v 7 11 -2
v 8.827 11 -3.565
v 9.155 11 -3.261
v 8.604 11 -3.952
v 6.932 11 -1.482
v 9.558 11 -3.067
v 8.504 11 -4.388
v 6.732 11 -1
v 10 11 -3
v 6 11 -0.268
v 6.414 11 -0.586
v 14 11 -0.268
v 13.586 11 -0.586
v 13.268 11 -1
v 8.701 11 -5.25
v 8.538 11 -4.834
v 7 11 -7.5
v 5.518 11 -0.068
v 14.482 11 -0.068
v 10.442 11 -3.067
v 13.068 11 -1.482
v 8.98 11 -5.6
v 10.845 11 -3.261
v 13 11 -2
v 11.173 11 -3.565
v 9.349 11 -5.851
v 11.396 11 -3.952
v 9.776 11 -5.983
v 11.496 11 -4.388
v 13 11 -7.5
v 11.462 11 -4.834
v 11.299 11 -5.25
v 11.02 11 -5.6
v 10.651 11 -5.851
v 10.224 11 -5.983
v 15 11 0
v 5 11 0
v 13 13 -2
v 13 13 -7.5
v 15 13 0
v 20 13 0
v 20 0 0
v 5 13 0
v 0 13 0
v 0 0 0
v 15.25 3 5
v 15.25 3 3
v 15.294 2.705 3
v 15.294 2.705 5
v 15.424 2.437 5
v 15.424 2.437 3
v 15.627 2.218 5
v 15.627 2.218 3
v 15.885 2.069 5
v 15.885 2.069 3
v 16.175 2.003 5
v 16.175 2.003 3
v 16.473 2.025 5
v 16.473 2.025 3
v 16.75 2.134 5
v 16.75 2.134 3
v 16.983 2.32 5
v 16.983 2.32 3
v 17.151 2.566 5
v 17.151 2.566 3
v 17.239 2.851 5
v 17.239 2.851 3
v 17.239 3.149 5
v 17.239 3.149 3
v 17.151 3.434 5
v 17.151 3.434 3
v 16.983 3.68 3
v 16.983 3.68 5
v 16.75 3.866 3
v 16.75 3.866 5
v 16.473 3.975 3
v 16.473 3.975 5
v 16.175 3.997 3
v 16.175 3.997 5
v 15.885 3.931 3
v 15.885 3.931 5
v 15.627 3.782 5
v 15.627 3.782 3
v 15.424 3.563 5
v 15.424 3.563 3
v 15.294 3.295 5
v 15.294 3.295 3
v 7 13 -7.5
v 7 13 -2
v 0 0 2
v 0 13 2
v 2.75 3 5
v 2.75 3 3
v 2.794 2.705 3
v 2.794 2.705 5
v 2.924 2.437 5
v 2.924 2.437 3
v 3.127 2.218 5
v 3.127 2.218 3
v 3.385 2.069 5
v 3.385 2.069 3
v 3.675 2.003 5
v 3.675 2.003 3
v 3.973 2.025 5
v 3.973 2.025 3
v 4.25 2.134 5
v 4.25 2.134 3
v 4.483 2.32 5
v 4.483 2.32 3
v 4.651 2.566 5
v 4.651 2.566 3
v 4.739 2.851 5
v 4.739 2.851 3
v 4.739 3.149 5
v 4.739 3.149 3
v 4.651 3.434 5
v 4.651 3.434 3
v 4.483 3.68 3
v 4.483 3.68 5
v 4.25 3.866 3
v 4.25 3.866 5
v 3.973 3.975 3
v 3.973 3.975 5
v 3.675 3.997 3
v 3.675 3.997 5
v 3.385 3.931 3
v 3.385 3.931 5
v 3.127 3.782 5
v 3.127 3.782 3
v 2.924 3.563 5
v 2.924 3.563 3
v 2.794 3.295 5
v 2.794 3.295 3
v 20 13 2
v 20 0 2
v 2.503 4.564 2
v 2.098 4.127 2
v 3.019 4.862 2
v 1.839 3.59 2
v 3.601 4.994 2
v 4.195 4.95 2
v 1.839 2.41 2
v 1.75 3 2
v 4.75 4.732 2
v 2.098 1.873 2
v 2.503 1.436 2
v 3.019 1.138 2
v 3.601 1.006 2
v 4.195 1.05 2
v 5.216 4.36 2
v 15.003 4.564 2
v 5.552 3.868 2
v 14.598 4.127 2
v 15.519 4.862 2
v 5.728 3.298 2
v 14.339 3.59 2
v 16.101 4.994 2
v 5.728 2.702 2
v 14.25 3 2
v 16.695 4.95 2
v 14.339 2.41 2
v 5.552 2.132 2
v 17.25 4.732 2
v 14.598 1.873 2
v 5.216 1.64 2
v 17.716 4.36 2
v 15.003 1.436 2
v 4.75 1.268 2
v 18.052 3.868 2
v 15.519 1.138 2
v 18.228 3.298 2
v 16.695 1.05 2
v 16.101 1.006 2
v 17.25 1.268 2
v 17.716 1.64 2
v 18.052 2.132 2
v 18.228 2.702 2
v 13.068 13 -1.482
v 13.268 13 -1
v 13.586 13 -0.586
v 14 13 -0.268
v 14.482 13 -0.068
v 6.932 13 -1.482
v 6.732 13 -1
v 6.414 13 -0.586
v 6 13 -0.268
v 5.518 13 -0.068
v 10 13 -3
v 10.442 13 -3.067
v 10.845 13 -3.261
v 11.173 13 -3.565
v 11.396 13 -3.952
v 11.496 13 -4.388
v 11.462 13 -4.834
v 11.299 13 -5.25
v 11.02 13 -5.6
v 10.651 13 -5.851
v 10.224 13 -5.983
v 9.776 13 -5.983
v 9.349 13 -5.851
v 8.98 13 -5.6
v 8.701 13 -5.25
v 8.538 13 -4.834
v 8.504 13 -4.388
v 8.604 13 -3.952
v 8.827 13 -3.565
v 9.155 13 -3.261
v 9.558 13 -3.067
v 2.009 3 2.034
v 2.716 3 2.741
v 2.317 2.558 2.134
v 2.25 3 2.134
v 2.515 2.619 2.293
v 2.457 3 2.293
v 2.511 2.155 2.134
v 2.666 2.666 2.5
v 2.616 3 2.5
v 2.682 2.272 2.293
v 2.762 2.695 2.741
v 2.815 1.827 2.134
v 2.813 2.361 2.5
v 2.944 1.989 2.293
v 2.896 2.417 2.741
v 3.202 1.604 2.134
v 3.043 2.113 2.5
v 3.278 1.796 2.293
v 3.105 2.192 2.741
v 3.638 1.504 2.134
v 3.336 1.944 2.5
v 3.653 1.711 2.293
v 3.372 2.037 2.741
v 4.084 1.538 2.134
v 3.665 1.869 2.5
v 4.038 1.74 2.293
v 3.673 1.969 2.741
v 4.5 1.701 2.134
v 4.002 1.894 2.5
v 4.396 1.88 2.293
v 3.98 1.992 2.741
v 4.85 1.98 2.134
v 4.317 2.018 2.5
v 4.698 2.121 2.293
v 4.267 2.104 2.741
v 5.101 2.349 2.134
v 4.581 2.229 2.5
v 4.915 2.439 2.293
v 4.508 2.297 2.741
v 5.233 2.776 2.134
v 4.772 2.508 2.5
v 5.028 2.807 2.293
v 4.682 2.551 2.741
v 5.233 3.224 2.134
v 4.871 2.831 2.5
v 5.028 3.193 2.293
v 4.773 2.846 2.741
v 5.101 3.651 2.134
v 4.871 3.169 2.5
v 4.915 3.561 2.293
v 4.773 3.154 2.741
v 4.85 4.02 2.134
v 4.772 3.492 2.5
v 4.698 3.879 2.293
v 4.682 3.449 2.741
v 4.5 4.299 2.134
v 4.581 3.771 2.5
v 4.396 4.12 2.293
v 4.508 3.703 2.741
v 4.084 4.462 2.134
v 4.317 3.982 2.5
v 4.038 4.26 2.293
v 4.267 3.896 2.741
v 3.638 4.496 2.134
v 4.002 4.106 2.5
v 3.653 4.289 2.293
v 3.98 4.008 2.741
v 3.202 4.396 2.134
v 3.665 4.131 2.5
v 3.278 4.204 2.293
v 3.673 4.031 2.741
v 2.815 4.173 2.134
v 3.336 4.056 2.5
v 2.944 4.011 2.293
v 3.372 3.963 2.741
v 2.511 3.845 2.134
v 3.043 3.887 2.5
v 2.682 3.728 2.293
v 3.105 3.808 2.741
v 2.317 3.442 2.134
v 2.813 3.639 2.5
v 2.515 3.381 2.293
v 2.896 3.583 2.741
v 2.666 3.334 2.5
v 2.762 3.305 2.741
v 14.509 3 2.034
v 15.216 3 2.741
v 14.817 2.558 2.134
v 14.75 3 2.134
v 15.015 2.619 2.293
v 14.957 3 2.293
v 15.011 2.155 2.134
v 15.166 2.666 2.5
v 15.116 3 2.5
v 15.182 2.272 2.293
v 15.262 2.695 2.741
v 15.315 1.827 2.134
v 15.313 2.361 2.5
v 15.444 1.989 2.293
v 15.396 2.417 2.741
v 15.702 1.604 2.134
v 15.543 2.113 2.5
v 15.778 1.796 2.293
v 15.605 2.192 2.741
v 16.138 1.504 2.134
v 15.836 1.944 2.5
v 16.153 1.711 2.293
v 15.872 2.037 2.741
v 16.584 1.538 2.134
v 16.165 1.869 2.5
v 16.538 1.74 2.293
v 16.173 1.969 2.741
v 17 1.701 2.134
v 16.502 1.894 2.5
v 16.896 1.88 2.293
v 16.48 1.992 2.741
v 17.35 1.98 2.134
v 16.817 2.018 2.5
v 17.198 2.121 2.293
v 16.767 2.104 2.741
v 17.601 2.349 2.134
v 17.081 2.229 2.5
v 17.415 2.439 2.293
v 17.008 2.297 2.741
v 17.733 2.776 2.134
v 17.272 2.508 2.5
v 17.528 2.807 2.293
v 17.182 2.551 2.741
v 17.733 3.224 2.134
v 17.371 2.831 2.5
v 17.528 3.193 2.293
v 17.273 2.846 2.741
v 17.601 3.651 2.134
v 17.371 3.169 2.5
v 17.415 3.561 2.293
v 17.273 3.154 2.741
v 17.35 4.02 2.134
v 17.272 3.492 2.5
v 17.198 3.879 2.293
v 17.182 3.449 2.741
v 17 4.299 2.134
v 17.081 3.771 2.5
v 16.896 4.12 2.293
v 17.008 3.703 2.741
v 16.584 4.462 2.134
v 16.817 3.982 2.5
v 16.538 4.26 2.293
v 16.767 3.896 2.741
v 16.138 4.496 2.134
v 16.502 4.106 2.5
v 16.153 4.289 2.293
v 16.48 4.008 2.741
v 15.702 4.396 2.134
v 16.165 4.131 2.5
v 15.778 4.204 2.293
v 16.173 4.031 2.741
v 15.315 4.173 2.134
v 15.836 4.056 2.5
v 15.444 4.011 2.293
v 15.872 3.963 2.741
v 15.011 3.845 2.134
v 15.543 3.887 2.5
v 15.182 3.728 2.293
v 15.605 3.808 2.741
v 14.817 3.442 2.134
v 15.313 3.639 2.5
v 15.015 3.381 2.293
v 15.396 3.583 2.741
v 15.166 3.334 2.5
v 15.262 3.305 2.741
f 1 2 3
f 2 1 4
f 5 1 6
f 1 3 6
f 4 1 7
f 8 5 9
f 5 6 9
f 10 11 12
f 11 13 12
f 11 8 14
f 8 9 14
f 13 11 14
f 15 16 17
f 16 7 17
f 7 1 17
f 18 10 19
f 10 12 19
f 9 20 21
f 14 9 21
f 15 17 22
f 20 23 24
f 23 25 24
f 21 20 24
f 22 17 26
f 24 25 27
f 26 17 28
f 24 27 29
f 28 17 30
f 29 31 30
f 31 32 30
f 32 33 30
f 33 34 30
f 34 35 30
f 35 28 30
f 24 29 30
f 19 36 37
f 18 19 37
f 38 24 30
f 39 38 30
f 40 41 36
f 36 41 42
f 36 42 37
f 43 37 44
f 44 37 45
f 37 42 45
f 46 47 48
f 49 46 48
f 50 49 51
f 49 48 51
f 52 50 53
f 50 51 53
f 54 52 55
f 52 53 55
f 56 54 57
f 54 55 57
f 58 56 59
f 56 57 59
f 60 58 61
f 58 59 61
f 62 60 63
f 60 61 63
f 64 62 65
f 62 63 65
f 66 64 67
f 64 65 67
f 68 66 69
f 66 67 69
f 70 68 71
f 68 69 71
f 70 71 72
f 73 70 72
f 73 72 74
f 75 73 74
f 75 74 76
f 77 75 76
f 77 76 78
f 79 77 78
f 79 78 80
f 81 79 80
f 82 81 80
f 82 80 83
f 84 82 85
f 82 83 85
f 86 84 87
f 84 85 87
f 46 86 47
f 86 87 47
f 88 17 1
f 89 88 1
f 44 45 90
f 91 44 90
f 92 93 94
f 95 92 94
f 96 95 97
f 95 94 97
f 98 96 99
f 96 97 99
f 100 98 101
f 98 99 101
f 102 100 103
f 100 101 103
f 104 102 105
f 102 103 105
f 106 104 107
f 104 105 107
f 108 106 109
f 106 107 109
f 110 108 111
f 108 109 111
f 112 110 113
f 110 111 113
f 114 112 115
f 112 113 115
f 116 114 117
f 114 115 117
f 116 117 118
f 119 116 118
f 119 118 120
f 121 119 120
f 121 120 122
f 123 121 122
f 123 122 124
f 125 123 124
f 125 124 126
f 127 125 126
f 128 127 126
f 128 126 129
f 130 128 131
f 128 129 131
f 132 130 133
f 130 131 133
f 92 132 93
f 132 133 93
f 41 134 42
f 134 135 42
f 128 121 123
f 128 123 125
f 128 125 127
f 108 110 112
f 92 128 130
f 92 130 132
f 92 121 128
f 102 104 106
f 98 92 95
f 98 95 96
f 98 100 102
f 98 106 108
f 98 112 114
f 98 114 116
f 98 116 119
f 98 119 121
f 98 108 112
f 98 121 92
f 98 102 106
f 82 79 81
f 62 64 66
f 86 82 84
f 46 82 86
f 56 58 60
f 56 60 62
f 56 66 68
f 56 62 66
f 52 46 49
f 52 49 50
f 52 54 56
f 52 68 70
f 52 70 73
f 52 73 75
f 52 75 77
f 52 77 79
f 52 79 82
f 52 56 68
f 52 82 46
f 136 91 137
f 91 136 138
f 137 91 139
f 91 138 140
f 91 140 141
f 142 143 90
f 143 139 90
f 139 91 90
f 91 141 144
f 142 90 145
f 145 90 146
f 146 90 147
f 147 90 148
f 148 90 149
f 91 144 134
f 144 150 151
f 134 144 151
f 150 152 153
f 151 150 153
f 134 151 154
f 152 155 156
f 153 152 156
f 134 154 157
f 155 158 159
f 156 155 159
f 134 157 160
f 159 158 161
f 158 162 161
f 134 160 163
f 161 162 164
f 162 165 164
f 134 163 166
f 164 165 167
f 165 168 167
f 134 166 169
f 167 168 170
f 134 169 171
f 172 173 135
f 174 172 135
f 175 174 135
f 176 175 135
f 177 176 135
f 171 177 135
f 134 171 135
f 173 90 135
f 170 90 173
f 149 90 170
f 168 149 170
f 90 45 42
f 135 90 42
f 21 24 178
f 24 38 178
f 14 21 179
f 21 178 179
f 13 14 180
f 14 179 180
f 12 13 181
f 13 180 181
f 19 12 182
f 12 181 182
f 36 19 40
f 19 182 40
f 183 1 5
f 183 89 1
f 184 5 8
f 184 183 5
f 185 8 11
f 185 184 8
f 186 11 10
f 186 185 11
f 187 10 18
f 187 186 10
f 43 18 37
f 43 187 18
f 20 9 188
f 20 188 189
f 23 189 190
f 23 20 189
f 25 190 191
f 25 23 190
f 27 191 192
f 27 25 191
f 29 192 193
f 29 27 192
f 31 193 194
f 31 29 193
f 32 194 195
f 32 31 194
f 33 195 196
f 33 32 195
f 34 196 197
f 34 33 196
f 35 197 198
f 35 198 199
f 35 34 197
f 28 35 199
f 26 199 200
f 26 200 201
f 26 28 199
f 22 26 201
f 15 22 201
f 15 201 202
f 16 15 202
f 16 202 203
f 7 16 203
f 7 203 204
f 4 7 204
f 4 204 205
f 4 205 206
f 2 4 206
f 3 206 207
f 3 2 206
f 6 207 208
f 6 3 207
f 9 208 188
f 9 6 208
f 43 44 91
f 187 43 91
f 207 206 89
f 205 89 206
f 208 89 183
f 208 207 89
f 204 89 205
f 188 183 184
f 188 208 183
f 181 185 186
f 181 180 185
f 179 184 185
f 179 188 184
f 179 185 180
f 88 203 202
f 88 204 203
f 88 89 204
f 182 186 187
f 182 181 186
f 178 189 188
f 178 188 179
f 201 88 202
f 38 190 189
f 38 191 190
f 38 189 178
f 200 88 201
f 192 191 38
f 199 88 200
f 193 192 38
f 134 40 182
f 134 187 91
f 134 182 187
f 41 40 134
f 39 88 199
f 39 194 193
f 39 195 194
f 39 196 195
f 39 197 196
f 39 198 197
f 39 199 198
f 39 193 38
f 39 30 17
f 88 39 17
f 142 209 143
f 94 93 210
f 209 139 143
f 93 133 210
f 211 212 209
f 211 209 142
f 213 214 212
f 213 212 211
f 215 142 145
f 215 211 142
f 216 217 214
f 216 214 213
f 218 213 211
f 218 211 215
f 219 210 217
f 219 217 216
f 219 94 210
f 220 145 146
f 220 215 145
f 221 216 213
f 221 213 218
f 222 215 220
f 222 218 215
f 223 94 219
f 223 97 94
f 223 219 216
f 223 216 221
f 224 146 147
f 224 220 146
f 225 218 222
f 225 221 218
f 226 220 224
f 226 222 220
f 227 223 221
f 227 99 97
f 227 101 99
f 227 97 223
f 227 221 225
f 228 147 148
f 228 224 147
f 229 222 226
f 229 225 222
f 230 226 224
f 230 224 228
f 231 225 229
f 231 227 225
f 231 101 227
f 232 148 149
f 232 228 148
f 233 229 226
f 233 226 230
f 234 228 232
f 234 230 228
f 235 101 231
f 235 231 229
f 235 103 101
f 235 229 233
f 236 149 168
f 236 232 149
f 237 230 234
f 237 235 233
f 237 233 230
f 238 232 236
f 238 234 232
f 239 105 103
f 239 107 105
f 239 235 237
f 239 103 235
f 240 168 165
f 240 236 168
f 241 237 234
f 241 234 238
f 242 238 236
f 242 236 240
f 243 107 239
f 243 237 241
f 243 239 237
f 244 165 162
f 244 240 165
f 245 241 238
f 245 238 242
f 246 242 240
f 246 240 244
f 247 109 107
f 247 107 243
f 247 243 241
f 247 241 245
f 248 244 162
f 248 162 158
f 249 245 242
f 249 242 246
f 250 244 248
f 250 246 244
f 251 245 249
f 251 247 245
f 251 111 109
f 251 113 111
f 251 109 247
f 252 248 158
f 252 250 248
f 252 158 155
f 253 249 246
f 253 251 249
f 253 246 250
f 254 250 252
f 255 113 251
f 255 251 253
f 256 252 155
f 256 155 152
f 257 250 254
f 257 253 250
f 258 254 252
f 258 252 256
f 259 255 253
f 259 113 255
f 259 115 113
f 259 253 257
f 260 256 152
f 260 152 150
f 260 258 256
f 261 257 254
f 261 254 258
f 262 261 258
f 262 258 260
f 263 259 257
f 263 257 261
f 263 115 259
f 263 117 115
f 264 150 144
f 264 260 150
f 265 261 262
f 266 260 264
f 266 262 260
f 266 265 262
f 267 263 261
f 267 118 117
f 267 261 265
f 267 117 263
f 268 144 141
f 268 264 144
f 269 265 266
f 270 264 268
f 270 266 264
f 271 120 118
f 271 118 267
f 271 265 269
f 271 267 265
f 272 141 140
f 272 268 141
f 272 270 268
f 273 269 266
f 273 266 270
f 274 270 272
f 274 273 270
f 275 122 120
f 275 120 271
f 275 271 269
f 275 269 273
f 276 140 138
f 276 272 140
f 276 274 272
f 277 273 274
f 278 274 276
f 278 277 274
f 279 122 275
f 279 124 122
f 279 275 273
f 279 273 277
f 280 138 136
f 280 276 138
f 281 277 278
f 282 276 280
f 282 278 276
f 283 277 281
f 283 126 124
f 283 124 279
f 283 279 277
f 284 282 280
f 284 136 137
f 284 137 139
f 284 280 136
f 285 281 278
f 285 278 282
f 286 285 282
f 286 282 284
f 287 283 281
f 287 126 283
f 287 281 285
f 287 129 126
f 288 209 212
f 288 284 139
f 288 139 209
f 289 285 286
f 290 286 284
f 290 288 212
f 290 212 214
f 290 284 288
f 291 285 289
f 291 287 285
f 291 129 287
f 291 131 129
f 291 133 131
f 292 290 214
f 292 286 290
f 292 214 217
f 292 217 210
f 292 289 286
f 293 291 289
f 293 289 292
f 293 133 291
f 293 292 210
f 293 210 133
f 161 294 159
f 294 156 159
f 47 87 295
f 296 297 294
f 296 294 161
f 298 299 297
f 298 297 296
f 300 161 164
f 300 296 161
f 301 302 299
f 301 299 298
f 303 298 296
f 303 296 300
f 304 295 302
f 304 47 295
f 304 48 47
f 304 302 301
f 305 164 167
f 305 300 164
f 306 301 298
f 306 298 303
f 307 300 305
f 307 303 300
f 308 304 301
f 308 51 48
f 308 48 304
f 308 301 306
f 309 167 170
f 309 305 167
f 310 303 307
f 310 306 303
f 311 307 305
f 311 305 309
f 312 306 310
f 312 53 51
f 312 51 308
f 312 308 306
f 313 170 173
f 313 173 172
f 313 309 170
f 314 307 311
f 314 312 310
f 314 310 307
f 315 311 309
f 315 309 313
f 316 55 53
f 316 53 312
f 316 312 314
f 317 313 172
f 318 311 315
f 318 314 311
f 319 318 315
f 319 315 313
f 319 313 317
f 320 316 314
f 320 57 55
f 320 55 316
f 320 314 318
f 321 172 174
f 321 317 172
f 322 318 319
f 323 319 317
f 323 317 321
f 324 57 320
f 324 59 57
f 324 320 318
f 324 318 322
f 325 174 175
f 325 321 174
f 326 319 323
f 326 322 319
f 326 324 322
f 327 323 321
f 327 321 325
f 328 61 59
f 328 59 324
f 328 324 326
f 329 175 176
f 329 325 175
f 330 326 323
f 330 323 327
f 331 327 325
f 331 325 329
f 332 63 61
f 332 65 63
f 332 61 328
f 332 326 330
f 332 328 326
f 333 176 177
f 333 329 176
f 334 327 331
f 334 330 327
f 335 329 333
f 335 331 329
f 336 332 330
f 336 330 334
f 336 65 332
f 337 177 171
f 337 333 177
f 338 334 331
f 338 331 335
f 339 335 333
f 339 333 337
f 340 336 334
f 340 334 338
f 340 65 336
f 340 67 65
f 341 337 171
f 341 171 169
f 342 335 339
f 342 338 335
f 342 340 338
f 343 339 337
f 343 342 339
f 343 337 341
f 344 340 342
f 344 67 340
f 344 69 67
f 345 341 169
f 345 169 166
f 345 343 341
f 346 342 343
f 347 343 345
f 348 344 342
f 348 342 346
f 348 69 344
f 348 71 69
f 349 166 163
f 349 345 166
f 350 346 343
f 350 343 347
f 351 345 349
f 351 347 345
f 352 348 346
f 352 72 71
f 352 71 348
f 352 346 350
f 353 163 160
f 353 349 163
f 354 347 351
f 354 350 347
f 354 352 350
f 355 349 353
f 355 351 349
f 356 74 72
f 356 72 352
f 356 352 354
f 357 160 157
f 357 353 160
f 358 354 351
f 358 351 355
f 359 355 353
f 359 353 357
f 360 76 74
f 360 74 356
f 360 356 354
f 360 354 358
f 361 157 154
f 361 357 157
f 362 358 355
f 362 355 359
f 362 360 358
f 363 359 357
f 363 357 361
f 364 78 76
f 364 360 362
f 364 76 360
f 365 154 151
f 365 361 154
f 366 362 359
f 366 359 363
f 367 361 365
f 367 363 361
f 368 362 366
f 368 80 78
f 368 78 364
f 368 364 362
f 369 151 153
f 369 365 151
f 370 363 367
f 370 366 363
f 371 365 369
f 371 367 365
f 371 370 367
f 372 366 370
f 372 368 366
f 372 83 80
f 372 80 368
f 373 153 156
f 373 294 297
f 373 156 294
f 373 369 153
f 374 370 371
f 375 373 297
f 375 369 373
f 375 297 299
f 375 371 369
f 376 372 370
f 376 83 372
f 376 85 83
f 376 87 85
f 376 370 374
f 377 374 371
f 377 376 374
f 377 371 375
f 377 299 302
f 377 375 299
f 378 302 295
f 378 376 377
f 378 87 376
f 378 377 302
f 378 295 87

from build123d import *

# Parameters (mm, degrees)
ESQUISSE1_W        = 20
ESQUISSE1_H        = 11
BOSS_EXTRU_1_DEPTH = 2
ESQUISSE2_R        = 1
BOSS_EXTRU_2_DEPTH = 3
CONG_1_R           = 1
ESQUISSE3_R        = 1.5
BOSS_EXTRU_3_DEPTH = 2
CONG_2_R           = 2


with BuildPart() as part:
    # Esquisse1 → Boss.-Extru.1 (new body)
    with BuildSketch(Plane.XY):
        with Locations((10, 5.5)):
            Rectangle(ESQUISSE1_W, ESQUISSE1_H)
    extrude(amount=BOSS_EXTRU_1_DEPTH)

    # Esquisse2 → Boss.-Extru.2 (add)
    with BuildSketch(Plane.XY.offset(2)):
        with Locations(Location((16.25, 3, 0), (0, 0, 180))):
            Circle(ESQUISSE2_R)
        with Locations(Location((3.75, 3, 0), (0, 0, 180))):
            Circle(ESQUISSE2_R)
    extrude(amount=BOSS_EXTRU_2_DEPTH)

    # Congé1
    cong_1_edges = [part.edges().sort_by_distance(p)[0] for p in [
        (17.25, 3, 2),
        (4.75, 3, 2),
    ]]
    fillet(cong_1_edges, radius=CONG_1_R)

    # Esquisse3 → Boss.-Extru.3 (add)
    with BuildSketch(Plane(origin=(0, 11, 0), x_dir=(1, 0, 0), z_dir=(0, 1, 0))):
        Polygon((0, 0), (0, -2), (20, -2), (20, 0), (13, 0), (13, 7.5), (7, 7.5), (7, 0), align=None)
        with Locations(Location((10, 4.5, 0), (0, 0, 270))):
            Circle(ESQUISSE3_R, mode=Mode.SUBTRACT)
    extrude(amount=BOSS_EXTRU_3_DEPTH)

    # Congé2
    cong_2_edges = [part.edges().sort_by_distance(p)[0] for p in [
        (7, 12, 0),
        (13, 12, 0),
    ]]
    fillet(cong_2_edges, radius=CONG_2_R)


solid = part.part
